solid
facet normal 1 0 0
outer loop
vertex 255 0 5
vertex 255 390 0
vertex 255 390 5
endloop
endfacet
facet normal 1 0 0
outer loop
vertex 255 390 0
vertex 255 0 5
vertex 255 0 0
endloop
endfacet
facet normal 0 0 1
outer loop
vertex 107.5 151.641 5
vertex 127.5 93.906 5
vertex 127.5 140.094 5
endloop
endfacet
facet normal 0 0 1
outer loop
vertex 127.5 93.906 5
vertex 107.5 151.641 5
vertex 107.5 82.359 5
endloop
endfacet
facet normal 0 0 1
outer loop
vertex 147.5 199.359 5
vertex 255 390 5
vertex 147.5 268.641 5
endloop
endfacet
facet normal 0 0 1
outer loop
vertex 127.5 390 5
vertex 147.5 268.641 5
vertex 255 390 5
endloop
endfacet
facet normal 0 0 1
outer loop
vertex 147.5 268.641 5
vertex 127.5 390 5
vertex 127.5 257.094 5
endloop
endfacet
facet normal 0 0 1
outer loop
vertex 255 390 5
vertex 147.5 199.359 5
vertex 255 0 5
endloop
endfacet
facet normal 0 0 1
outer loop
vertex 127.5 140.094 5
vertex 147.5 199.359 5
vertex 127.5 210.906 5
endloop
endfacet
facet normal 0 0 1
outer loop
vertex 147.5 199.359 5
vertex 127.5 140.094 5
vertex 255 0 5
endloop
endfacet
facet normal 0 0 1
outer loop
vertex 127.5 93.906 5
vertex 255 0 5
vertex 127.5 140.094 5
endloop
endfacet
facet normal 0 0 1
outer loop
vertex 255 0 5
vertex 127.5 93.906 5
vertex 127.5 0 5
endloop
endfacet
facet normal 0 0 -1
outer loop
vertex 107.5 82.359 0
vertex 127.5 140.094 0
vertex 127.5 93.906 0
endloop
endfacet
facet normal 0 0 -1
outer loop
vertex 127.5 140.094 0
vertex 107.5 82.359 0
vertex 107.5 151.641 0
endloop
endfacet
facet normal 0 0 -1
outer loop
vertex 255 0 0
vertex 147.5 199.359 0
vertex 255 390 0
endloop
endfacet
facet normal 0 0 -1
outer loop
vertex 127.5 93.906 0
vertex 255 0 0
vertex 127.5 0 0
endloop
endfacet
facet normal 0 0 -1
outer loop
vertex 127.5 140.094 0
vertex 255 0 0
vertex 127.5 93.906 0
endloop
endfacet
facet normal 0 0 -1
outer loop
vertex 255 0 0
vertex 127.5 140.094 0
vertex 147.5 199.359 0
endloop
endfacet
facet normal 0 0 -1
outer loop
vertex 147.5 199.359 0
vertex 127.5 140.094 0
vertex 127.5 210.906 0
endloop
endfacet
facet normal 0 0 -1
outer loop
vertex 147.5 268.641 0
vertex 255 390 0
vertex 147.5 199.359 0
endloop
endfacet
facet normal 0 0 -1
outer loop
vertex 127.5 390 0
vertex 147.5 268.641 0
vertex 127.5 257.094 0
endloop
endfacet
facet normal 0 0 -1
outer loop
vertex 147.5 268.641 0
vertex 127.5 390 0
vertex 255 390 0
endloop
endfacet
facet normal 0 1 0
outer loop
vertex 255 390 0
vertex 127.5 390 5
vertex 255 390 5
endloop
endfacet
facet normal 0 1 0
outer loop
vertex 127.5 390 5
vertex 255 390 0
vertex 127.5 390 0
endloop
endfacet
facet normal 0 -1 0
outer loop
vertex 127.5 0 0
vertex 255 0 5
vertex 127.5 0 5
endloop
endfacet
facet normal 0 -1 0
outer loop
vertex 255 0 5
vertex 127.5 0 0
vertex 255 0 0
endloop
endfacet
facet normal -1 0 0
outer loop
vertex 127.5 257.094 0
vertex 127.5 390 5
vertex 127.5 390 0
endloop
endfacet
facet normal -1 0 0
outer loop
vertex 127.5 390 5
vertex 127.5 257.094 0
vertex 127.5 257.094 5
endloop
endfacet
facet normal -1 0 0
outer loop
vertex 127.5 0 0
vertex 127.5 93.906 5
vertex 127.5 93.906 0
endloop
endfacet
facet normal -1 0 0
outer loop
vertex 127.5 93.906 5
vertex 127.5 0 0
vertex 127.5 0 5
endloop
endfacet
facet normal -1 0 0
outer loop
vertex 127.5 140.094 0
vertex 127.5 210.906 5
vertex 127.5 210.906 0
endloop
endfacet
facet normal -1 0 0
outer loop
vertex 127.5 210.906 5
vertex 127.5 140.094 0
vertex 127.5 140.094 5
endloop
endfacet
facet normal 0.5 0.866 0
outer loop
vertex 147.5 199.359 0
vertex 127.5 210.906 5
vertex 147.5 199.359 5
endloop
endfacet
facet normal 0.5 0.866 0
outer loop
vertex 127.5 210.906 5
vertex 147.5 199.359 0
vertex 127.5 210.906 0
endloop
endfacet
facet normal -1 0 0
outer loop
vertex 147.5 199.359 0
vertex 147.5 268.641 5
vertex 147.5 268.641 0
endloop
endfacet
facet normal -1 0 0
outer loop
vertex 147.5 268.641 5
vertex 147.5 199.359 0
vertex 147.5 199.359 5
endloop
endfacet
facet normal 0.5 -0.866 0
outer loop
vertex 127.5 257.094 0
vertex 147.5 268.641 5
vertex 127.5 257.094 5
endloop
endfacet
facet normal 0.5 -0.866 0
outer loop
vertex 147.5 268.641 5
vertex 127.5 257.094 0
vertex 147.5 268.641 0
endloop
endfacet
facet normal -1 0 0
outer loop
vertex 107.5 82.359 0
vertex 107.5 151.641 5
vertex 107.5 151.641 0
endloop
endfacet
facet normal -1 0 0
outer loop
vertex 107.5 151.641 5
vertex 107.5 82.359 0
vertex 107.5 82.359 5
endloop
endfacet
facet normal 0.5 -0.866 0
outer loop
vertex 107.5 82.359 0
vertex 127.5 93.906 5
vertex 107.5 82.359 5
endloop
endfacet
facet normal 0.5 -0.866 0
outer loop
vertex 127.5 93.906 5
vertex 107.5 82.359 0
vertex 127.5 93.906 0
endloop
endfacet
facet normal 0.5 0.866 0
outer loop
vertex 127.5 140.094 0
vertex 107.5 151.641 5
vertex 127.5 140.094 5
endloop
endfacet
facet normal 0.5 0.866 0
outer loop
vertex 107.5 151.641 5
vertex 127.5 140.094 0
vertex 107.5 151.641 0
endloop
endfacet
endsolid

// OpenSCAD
font1 = "Arial:style=Bold";
cardSpacer =10;


cardHeight = 3;

bigCardWidth = 66;
bigCardDepth = 91;

smallCardWidth = 44;
smallCardDepth = 66;

boardHeight = 5;
boardWidth = 255;
boardDepth = bigCardWidth*3+smallCardDepth*2+cardSpacer*6;

healthCube = 11;
healthSpacer = 3;

characterName =  "ROBERTA"; // Roberta Tolben Quill Olette Elwyn
        difference() {
            cube([boardWidth,boardDepth,boardHeight]);
            translate([0,0, -1]) cube([boardWidth/2,boardDepth,boardHeight+2]);
            rotate([0,180,0]) translate([-(boardWidth/2),  boardDepth*0.6, -boardHeight]) linear_extrude(height = 5) circle(40,$fn=3);%circle(20,$fn=90);
        }
        translate([boardWidth/2,  boardDepth*0.3]) linear_extrude(height = 5) circle(40,$fn=3);%circle(20,$fn=90);



            
module small_card(px, py, content) {
    translate([px, py, 3]) cube([smallCardWidth, smallCardDepth, cardHeight]);
    translate ([px+smallCardWidth-13, py+smallCardDepth-4, 1]) bLabel(content, 7);
}

module big_card(px, py, content) {
    translate([px, py, 3]) rotate([0,0, 0]) cube([bigCardDepth, bigCardWidth,cardHeight]);
    translate ([px+bigCardDepth-13, py+smallCardDepth-4, 1]) bLabel(content, 7);
}
module healthCube(px, py, content) {
    color("green") translate([px, py, 2]) rotate([0,0, 0]) cube([healthCube, healthCube,4]);
    color("black") translate ([px+2, py+healthSpacer+5, 1]) {
        rotate ([0,0,270]) {
            linear_extrude(height = 5) {
                text(content, font = font1, size = 6, direction = "ltr" );
            }
        }
    }
}
module bLabel(label, font_size) {
    rotate ([0,0,270]) {
        linear_extrude(height = 3) {
            text(label, font = font1, size = font_size, direction = "ltr" );
        }
    }
}
